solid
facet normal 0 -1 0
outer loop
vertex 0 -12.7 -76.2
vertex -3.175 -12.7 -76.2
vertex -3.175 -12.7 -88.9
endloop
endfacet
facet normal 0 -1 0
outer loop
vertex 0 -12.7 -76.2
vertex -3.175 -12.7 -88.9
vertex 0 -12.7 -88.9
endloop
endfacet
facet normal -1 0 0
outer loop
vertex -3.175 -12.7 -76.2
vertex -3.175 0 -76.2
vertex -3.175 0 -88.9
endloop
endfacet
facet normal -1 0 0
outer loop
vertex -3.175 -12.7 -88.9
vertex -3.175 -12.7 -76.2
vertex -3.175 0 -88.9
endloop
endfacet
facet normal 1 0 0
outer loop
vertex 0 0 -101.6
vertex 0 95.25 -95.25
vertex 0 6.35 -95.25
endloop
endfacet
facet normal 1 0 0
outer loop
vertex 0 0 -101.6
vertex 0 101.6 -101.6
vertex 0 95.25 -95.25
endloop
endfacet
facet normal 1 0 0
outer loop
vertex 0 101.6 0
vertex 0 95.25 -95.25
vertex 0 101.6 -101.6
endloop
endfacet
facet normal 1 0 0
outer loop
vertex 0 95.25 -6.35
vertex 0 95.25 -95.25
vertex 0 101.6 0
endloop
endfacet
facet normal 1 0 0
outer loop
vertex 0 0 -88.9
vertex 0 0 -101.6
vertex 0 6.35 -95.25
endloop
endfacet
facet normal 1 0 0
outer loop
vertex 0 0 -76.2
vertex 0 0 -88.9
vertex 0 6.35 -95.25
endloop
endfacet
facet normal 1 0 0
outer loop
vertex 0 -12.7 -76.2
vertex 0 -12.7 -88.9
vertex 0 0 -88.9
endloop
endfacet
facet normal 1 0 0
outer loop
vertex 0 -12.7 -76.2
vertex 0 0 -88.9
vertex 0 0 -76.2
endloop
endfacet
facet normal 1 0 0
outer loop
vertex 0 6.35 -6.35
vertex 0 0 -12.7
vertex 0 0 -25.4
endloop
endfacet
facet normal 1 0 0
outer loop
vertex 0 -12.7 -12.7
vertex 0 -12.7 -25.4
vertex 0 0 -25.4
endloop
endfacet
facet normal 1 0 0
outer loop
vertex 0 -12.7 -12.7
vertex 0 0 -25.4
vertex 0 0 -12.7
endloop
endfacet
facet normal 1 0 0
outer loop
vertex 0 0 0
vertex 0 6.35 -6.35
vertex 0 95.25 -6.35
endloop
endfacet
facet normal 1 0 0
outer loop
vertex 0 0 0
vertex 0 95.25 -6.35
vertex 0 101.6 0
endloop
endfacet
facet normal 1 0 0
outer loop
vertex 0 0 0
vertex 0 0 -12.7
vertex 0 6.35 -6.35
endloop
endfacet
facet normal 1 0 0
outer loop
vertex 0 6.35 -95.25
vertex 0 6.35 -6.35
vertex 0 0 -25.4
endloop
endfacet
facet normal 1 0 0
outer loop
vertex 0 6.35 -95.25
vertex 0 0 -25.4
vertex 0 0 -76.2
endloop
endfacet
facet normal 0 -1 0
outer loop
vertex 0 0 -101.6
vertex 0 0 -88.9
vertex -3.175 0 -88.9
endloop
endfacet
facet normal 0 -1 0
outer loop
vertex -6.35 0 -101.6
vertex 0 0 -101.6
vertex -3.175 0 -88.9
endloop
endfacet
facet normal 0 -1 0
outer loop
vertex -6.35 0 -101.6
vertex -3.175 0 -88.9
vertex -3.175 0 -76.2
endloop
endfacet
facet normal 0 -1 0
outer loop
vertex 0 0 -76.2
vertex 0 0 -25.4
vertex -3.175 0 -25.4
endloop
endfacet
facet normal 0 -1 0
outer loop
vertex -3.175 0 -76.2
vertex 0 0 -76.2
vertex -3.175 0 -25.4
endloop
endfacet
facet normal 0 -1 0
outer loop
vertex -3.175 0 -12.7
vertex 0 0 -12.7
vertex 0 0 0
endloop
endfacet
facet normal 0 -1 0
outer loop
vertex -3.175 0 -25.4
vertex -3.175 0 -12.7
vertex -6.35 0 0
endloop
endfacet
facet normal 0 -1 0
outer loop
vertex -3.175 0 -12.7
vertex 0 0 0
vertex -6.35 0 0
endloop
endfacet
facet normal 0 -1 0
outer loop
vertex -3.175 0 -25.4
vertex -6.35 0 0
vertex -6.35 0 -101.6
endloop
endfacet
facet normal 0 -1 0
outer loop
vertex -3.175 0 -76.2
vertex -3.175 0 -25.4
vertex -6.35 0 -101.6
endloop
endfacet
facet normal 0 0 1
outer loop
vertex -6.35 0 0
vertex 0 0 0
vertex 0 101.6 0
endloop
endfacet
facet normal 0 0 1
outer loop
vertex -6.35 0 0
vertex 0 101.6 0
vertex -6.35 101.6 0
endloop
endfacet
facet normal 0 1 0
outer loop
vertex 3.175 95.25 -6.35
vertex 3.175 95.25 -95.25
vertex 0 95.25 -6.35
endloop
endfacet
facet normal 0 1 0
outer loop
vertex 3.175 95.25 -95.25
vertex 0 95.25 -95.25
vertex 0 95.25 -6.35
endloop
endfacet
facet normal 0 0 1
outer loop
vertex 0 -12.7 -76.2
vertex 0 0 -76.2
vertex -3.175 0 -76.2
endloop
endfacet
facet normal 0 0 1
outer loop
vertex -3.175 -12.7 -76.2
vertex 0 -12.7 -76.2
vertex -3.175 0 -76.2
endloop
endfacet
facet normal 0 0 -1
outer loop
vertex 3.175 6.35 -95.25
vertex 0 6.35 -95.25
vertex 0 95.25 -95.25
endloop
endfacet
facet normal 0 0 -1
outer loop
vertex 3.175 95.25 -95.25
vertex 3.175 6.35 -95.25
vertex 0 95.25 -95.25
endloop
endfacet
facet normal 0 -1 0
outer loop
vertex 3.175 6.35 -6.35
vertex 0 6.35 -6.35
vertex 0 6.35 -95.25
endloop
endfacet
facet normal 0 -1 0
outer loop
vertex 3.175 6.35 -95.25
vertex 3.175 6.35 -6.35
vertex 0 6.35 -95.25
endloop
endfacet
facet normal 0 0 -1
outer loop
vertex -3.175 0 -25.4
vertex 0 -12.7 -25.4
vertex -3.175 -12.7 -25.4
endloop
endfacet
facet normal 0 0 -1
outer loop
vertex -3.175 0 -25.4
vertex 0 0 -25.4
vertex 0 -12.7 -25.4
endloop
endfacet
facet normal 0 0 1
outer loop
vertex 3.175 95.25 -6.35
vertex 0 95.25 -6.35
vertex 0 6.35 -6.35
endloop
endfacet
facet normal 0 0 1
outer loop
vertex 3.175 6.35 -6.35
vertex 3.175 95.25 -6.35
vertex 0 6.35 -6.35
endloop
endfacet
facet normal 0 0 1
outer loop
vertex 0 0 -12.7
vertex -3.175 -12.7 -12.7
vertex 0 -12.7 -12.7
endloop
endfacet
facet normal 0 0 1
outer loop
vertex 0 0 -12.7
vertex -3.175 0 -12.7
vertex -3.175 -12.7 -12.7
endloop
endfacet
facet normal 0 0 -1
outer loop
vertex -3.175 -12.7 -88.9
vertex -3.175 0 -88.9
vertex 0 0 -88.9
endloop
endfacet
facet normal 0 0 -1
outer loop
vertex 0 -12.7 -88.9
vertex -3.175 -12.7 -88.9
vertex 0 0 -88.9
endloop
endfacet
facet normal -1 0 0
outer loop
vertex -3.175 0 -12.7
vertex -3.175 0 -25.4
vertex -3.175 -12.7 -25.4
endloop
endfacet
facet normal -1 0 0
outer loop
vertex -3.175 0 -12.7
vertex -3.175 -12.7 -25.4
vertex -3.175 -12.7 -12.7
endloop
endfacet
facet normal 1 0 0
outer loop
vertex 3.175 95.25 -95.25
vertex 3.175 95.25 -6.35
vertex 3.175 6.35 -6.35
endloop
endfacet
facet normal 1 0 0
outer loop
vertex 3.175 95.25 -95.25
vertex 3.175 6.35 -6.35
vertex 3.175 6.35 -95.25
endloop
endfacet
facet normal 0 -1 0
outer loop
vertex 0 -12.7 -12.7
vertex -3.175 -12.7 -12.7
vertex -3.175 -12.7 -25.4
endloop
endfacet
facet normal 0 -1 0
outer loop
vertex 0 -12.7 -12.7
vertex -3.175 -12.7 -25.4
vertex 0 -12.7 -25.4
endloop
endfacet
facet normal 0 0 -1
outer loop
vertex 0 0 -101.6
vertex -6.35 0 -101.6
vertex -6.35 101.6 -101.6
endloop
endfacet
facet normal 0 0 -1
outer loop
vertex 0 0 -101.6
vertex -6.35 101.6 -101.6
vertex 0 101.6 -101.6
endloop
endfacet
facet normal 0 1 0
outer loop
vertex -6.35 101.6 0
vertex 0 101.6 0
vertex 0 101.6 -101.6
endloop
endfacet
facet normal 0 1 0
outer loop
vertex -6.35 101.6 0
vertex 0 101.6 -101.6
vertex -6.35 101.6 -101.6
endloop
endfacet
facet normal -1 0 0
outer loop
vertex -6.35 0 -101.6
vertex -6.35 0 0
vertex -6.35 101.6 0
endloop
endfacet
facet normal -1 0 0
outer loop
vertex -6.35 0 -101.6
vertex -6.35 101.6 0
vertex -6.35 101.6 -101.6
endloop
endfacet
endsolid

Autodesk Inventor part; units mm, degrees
ref_plane "YZ Plane" through (0, 0, 0) normal (1, 0, 0) x (0, 1, 0)
ref_plane "XZ Plane" through (0, 0, 0) normal (0, 1, 0) x (-1, 0, 0)
ref_plane "XY Plane" through (0, 0, 0) normal (0, 0, 1) x (1, 0, 0)
sketch "Sketch1" plane through (0, 0, 0) normal (0, 1, 0) x (-1, 0, 0)
  line L0 (0, 0) -> (6.35, 0)
  line L1 (6.35, 0) -> (6.35, -101.6)
  line L2 (6.35, -101.6) -> (0, -101.6)
  line L3 (0, -101.6) -> (0, 0)
  dimension "d0" = 6.35
  dimension "d1" = 101.6
extrude "Extrusion1" add sketch "Sketch1" along normal blind 101.6
sketch "Sketch2" plane through (0, 0, 0) normal (0, -1, 0) x (1, 0, 0)
  line L0 (0, 0) -> (0, -25.4)
  line L1 (0, 0) -> (0, -101.6) projected
  line L2 (0, -101.6) -> (0, -76.2)
  line L3 (0, -25.4) -> (-3.175, -25.4)
  line L4 (-3.175, -25.4) -> (-3.175, -12.7)
  line L5 (-3.175, -12.7) -> (0, -12.7)
  line L6 (0, -12.7) -> (0, -25.4)
  line L7 (0, -76.2) -> (-3.175, -76.2)
  line L8 (-3.175, -76.2) -> (-3.175, -88.9)
  line L9 (-3.175, -88.9) -> (0, -88.9)
  line L10 (0, -88.9) -> (0, -76.2)
  dimension "d4" = 25.4
  dimension "d5" = 25.4
  dimension "d6" = 3.175
  dimension "d7" = 12.7
  dimension "d8" = 3.175
  dimension "d9" = 12.7
extrude "Extrusion2" add sketch "Sketch2" along normal blind 12.7
sketch "Sketch3" plane through (0, 0, -101.6) normal (1, 0, 0) x (0, 0, -1)
  line L0 (0, 0) -> (0, 101.6) projected
  line L1 (0, 0) -> (-12.7, 0) projected
  line L2 (-101.6, 0) -> (-101.6, 101.6) projected
  line L3 (-95.25, 95.25) -> (-95.25, 6.35)
  line L4 (-95.25, 6.35) -> (-6.35, 6.35)
  line L5 (-6.35, 6.35) -> (-6.35, 95.25)
  line L6 (-6.35, 95.25) -> (-95.25, 95.25)
  line L7 (-101.6, 0) -> (0, 0) projected
  line L8 (0, 101.6) -> (-101.6, 101.6) projected
  dimension "d20" = 88.9
  dimension "d22" = 6.35
  dimension "d23" = 6.35
  dimension "d24" = 6.35
extrude "Extrusion4" add sketch "Sketch3" along normal blind 3.175 contours L6 L5 L4 L3
properties part number "top"
